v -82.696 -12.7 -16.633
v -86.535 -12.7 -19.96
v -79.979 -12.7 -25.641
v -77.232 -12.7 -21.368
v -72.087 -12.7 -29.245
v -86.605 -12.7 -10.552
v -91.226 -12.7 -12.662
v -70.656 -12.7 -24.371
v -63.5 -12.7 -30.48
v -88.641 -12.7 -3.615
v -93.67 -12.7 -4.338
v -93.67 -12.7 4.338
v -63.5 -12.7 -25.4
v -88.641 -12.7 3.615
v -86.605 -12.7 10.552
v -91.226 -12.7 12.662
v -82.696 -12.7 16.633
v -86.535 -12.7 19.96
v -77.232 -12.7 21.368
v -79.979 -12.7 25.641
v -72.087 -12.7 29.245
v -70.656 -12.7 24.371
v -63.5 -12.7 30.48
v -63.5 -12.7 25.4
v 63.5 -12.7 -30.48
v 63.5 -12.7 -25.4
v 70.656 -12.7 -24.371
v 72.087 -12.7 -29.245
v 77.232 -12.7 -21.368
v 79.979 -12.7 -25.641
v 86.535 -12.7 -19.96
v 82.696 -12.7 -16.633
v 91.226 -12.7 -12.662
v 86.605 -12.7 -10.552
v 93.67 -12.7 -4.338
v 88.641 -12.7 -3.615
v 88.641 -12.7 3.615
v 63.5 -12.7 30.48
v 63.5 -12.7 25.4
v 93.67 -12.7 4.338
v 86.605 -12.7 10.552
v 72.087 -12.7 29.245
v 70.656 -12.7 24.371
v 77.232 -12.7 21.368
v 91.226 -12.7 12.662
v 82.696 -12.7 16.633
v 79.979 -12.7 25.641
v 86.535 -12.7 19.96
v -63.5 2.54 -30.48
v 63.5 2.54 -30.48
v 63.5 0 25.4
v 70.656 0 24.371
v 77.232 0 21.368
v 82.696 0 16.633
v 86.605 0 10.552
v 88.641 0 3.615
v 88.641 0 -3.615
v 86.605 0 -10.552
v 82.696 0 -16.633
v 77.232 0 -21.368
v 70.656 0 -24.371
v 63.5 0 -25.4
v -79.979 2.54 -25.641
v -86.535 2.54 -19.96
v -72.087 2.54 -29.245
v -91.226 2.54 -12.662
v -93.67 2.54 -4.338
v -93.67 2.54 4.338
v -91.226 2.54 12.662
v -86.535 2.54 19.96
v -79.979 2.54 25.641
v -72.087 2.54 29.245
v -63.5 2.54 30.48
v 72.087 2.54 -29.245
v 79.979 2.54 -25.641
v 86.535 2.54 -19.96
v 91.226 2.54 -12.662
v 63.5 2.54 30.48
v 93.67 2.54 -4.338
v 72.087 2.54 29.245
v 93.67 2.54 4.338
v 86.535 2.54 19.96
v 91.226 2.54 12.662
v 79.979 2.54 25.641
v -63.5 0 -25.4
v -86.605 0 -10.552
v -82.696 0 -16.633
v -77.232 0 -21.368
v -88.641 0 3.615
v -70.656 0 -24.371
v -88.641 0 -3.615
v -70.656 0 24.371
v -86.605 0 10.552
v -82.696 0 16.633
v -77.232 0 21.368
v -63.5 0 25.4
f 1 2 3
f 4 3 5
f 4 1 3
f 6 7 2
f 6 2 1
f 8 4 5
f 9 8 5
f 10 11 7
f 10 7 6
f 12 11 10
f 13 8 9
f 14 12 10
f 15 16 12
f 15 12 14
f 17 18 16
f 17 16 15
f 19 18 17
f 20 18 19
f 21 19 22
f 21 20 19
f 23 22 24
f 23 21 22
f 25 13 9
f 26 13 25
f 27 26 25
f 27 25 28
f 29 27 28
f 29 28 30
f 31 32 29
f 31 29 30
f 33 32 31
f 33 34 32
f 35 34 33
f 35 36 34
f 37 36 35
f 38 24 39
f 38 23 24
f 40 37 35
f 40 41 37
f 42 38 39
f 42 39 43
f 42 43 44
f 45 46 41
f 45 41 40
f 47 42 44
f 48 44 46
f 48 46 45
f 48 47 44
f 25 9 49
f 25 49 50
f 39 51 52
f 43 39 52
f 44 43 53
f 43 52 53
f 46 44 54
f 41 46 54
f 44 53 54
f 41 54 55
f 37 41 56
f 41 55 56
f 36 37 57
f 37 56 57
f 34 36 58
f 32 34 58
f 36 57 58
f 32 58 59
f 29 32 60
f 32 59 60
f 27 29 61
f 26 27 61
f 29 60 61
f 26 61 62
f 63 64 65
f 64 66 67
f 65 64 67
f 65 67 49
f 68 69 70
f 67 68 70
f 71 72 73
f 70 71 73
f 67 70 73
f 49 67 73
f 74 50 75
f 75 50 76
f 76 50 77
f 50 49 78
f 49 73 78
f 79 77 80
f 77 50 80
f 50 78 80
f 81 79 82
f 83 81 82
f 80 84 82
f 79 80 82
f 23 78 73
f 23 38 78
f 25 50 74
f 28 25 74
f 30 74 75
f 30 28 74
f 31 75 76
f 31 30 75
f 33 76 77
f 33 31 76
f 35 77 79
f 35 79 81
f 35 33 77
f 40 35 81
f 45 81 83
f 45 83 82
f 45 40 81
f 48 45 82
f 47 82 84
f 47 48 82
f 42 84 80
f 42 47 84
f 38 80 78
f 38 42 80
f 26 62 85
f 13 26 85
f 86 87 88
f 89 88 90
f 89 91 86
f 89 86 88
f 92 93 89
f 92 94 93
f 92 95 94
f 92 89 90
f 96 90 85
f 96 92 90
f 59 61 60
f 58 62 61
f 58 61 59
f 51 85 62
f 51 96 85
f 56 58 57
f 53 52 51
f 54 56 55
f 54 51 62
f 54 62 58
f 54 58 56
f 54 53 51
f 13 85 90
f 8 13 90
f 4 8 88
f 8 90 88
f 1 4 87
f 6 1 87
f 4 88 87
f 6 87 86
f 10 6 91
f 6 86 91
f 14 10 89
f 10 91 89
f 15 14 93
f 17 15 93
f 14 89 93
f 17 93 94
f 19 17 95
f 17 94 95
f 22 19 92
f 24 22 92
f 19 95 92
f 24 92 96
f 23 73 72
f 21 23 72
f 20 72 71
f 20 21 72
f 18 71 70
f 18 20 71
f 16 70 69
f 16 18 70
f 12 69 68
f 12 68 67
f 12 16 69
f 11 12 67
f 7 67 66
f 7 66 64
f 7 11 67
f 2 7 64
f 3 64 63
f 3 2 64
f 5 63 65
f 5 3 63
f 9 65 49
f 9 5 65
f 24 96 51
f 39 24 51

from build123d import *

# Parameters (mm, degrees)
F1_DEPTH = 12.7
F2_DEPTH = 2.54


with BuildPart() as f1:
    # F0 (on Front) → F1 (new body)
    with BuildSketch(Plane.XZ):
        with BuildLine():
            Line((63.5, 30.48), (-63.5, 30.48))
            ThreePointArc((-63.5, 30.48), (-93.98, 0), (-63.5, -30.48))
            Line((-63.5, -30.48), (63.5, -30.48))
            ThreePointArc((63.5, -30.48), (93.98, 0), (63.5, 30.48))
        make_face()
        with BuildLine():
            Line((63.5, -25.4), (-63.5, -25.4))
            ThreePointArc((-63.5, -25.4), (-88.9, 0), (-63.5, 25.4))
            Line((-63.5, 25.4), (63.5, 25.4))
            ThreePointArc((63.5, 25.4), (88.9, 0), (63.5, -25.4))
        make_face(mode=Mode.SUBTRACT)
    extrude(amount=F1_DEPTH)

    # F0 (on Front) → F2 (join)
    with BuildSketch(Plane.XZ):
        with BuildLine():
            Line((63.5, 30.48), (-63.5, 30.48))
            ThreePointArc((-63.5, 30.48), (-93.98, 0), (-63.5, -30.48))
            Line((-63.5, -30.48), (63.5, -30.48))
            ThreePointArc((63.5, -30.48), (93.98, 0), (63.5, 30.48))
        make_face()
        with BuildLine():
            Line((63.5, -25.4), (-63.5, -25.4))
            ThreePointArc((-63.5, -25.4), (-88.9, 0), (-63.5, 25.4))
            Line((-63.5, 25.4), (63.5, 25.4))
            ThreePointArc((63.5, 25.4), (88.9, 0), (63.5, -25.4))
        make_face(mode=Mode.SUBTRACT)
        with BuildLine():
            ThreePointArc((-63.5, 25.4), (-88.9, 0), (-63.5, -25.4))
            Line((-63.5, -25.4), (63.5, -25.4))
            ThreePointArc((63.5, -25.4), (88.9, 0), (63.5, 25.4))
            Line((63.5, 25.4), (-63.5, 25.4))
        make_face()
    extrude(amount=-F2_DEPTH)


solid = f1.part
